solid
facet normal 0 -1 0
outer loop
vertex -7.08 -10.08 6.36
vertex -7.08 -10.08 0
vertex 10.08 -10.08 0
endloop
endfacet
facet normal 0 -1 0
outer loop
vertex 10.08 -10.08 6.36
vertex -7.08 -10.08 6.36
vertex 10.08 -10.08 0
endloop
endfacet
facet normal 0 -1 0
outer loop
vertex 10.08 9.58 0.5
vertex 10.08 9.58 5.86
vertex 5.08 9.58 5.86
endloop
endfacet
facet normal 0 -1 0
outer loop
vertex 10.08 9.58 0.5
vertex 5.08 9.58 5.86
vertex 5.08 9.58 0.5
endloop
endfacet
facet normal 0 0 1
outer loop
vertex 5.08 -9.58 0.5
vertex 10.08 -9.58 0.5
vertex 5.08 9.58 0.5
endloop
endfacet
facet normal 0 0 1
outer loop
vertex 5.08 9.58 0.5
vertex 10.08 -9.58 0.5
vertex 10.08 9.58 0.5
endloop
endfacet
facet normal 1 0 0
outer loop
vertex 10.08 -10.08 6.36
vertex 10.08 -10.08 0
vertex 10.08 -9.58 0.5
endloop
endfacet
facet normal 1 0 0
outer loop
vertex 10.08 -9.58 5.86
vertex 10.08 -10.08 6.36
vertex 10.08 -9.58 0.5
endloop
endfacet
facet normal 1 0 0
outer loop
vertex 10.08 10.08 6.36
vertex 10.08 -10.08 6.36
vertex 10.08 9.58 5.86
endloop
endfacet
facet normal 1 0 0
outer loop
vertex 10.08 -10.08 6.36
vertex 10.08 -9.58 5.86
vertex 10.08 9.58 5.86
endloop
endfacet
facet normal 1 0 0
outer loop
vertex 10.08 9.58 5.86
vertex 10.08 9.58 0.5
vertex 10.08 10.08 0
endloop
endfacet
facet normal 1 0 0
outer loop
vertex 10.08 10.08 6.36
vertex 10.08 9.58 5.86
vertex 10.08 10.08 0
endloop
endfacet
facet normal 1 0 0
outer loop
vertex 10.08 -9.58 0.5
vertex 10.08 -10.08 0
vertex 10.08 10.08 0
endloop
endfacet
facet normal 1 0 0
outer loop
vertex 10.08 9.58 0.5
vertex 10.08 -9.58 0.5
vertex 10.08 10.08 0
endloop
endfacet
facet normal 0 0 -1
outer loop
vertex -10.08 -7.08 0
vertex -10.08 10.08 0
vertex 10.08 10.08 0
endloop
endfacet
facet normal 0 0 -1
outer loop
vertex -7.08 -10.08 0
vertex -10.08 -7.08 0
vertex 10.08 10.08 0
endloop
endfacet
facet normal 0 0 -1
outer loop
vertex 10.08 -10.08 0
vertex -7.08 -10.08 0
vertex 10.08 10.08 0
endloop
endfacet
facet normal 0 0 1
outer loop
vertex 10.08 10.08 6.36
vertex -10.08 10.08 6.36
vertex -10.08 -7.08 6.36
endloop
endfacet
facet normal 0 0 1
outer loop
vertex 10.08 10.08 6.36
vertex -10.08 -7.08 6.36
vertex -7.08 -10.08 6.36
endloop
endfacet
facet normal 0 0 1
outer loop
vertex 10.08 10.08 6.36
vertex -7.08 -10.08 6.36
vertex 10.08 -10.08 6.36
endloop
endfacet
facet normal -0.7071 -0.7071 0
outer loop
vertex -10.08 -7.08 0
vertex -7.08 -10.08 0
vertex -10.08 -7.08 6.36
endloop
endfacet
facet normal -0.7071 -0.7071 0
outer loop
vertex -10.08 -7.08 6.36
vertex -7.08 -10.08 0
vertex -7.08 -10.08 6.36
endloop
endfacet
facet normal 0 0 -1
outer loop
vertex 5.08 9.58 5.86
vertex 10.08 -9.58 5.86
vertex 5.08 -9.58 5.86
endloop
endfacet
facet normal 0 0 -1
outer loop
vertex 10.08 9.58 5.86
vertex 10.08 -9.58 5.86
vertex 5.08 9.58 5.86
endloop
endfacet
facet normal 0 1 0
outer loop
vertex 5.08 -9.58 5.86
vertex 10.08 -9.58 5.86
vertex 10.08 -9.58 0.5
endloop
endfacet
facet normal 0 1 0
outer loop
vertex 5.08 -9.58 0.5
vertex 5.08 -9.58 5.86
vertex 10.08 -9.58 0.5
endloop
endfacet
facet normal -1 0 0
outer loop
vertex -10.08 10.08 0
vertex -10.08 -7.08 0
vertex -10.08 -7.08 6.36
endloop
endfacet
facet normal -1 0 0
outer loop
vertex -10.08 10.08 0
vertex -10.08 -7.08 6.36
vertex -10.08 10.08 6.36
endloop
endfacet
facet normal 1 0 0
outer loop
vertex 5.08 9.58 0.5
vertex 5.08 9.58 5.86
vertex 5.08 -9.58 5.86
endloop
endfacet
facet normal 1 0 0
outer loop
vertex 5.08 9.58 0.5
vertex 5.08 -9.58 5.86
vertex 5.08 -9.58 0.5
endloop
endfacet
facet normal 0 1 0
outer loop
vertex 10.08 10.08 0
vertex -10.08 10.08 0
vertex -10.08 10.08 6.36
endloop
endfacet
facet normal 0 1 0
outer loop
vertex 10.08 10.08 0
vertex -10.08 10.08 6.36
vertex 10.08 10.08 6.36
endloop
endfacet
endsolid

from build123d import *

# Parameters (mm, degrees)
SKETCH_1_W          = 20.16
SKETCH_1_H          = 20.16
EXTRUDE_1_DEPTH     = 6.36
SKETCH_2_W          = 5.36
SKETCH_2_H          = 19.16
CUT_EXTRUDE_1_DEPTH = 5
CHAMFER_1_SIZE      = 3


with BuildPart() as part:
    # 草图1 → 凸台-拉伸1 (new body)
    with BuildSketch(Plane.XY):
        Rectangle(SKETCH_1_W, SKETCH_1_H)
    extrude(amount=EXTRUDE_1_DEPTH)

    # 草图2 → 切除-拉伸1 (cut)
    with BuildSketch(Plane(origin=(10.08, 0, 0), x_dir=(0, 0, -1), z_dir=(1, 0, 0))):
        with Locations((-3.18, 0)):
            Rectangle(SKETCH_2_W, SKETCH_2_H)
    extrude(amount=-CUT_EXTRUDE_1_DEPTH, mode=Mode.SUBTRACT)

    # 倒角1
    chamfer_1_edges = [part.edges().sort_by_distance(p)[0] for p in [
        (-10.08, -10.08, 3.18),
    ]]
    chamfer(chamfer_1_edges, length=CHAMFER_1_SIZE)


solid = part.part
